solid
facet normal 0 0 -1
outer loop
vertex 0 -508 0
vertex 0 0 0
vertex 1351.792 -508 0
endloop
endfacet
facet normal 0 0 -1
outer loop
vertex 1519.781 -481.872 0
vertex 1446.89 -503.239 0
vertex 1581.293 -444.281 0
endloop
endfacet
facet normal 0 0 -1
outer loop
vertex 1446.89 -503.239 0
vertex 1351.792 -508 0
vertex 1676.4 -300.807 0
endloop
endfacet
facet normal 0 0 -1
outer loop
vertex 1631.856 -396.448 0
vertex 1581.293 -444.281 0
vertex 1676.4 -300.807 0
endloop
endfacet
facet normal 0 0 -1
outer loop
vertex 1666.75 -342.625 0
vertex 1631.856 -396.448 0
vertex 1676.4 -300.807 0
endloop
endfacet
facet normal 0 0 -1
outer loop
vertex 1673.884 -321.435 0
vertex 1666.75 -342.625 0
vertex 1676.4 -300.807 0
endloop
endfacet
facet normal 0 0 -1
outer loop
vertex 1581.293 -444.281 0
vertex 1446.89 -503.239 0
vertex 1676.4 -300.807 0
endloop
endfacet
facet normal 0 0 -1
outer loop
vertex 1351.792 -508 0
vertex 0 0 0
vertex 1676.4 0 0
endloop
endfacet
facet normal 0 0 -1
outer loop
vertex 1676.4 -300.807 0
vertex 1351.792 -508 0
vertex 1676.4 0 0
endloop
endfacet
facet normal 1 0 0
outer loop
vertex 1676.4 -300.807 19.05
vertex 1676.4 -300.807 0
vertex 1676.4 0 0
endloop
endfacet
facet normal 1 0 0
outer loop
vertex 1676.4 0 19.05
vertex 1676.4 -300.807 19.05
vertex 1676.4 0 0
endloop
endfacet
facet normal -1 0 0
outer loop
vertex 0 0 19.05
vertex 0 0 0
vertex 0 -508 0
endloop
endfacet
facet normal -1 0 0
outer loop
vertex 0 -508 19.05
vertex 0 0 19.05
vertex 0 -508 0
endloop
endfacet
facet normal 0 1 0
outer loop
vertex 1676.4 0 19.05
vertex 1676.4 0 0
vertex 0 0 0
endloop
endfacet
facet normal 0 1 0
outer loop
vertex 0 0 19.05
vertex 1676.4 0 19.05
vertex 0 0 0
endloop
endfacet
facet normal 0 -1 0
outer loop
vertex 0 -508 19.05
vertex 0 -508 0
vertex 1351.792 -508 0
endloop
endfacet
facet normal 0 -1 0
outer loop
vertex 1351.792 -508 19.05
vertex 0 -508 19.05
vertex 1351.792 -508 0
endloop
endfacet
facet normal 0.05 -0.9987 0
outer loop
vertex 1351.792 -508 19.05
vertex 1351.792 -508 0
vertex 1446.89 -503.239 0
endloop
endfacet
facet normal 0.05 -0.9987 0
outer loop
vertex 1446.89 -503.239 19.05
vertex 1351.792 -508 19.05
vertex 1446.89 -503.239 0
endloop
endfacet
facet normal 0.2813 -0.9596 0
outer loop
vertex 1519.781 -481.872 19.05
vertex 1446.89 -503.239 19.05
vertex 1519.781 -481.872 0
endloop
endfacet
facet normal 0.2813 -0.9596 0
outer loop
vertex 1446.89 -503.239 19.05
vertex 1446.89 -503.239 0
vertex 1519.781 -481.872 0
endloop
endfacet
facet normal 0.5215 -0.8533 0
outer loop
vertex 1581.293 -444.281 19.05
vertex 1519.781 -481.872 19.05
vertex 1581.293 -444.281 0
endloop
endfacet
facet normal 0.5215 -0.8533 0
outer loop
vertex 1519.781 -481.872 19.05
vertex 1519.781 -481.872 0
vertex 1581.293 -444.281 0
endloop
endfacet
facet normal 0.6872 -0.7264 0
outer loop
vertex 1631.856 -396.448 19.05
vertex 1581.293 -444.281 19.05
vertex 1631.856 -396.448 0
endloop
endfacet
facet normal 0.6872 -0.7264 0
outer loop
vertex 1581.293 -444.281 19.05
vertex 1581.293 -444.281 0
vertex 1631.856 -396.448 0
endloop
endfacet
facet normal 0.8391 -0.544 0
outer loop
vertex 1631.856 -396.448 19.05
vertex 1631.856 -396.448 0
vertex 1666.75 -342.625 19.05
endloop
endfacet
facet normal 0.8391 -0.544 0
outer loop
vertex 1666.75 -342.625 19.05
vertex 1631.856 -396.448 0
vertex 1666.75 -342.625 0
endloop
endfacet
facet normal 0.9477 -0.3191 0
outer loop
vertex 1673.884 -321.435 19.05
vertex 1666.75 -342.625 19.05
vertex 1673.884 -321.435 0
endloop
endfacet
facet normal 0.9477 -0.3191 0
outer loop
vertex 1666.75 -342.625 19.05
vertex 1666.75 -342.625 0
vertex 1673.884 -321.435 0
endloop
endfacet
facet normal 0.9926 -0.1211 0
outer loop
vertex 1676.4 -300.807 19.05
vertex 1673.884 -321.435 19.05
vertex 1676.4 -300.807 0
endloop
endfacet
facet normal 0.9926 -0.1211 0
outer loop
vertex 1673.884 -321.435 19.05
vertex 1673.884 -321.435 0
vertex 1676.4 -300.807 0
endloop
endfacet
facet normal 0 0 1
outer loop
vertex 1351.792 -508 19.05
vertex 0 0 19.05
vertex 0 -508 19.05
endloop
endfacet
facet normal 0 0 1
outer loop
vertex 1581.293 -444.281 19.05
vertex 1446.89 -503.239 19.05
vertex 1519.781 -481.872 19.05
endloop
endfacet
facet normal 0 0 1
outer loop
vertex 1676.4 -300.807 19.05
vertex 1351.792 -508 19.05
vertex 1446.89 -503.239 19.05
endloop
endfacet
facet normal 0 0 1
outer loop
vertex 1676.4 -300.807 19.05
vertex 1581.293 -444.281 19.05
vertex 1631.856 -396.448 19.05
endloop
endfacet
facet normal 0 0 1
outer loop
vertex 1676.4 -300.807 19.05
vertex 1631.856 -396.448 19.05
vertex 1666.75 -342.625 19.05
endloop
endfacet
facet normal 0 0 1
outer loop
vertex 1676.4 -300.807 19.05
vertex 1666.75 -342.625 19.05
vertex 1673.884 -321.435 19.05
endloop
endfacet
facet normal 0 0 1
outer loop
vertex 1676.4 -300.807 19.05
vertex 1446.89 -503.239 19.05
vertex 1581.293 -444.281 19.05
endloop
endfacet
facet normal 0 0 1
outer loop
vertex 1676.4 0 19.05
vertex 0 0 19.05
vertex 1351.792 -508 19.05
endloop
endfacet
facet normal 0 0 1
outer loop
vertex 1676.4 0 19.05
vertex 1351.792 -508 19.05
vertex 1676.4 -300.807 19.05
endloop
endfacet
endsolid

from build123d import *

# Parameters (mm, degrees)
F1_DEPTH = 19.05


with BuildPart() as f1:
    # F0 (on Top) → F1 (new body)
    with BuildSketch(Plane.XY):
        with BuildLine():
            Line((1676.4, 0), (0, 0))
            Line((0, 0), (0, -508))
            Line((0, -508), (1351.7922725288, -508))
            add(Edge.make_bspline(
                [(1351.7922725288, -508), (1424.5377850671, -509.2571292397), (1545.3497992736, -499.7970663676), (1676.4, -359.6729882774), (1676.4, -300.8069336454)],
                knots=[0, 0, 0, 0, 0.4909939758, 1, 1, 1, 1], degree=3))
            Line((1676.4, -300.8069336454), (1676.4, 0))
        make_face()
    extrude(amount=F1_DEPTH)


solid = f1.part
